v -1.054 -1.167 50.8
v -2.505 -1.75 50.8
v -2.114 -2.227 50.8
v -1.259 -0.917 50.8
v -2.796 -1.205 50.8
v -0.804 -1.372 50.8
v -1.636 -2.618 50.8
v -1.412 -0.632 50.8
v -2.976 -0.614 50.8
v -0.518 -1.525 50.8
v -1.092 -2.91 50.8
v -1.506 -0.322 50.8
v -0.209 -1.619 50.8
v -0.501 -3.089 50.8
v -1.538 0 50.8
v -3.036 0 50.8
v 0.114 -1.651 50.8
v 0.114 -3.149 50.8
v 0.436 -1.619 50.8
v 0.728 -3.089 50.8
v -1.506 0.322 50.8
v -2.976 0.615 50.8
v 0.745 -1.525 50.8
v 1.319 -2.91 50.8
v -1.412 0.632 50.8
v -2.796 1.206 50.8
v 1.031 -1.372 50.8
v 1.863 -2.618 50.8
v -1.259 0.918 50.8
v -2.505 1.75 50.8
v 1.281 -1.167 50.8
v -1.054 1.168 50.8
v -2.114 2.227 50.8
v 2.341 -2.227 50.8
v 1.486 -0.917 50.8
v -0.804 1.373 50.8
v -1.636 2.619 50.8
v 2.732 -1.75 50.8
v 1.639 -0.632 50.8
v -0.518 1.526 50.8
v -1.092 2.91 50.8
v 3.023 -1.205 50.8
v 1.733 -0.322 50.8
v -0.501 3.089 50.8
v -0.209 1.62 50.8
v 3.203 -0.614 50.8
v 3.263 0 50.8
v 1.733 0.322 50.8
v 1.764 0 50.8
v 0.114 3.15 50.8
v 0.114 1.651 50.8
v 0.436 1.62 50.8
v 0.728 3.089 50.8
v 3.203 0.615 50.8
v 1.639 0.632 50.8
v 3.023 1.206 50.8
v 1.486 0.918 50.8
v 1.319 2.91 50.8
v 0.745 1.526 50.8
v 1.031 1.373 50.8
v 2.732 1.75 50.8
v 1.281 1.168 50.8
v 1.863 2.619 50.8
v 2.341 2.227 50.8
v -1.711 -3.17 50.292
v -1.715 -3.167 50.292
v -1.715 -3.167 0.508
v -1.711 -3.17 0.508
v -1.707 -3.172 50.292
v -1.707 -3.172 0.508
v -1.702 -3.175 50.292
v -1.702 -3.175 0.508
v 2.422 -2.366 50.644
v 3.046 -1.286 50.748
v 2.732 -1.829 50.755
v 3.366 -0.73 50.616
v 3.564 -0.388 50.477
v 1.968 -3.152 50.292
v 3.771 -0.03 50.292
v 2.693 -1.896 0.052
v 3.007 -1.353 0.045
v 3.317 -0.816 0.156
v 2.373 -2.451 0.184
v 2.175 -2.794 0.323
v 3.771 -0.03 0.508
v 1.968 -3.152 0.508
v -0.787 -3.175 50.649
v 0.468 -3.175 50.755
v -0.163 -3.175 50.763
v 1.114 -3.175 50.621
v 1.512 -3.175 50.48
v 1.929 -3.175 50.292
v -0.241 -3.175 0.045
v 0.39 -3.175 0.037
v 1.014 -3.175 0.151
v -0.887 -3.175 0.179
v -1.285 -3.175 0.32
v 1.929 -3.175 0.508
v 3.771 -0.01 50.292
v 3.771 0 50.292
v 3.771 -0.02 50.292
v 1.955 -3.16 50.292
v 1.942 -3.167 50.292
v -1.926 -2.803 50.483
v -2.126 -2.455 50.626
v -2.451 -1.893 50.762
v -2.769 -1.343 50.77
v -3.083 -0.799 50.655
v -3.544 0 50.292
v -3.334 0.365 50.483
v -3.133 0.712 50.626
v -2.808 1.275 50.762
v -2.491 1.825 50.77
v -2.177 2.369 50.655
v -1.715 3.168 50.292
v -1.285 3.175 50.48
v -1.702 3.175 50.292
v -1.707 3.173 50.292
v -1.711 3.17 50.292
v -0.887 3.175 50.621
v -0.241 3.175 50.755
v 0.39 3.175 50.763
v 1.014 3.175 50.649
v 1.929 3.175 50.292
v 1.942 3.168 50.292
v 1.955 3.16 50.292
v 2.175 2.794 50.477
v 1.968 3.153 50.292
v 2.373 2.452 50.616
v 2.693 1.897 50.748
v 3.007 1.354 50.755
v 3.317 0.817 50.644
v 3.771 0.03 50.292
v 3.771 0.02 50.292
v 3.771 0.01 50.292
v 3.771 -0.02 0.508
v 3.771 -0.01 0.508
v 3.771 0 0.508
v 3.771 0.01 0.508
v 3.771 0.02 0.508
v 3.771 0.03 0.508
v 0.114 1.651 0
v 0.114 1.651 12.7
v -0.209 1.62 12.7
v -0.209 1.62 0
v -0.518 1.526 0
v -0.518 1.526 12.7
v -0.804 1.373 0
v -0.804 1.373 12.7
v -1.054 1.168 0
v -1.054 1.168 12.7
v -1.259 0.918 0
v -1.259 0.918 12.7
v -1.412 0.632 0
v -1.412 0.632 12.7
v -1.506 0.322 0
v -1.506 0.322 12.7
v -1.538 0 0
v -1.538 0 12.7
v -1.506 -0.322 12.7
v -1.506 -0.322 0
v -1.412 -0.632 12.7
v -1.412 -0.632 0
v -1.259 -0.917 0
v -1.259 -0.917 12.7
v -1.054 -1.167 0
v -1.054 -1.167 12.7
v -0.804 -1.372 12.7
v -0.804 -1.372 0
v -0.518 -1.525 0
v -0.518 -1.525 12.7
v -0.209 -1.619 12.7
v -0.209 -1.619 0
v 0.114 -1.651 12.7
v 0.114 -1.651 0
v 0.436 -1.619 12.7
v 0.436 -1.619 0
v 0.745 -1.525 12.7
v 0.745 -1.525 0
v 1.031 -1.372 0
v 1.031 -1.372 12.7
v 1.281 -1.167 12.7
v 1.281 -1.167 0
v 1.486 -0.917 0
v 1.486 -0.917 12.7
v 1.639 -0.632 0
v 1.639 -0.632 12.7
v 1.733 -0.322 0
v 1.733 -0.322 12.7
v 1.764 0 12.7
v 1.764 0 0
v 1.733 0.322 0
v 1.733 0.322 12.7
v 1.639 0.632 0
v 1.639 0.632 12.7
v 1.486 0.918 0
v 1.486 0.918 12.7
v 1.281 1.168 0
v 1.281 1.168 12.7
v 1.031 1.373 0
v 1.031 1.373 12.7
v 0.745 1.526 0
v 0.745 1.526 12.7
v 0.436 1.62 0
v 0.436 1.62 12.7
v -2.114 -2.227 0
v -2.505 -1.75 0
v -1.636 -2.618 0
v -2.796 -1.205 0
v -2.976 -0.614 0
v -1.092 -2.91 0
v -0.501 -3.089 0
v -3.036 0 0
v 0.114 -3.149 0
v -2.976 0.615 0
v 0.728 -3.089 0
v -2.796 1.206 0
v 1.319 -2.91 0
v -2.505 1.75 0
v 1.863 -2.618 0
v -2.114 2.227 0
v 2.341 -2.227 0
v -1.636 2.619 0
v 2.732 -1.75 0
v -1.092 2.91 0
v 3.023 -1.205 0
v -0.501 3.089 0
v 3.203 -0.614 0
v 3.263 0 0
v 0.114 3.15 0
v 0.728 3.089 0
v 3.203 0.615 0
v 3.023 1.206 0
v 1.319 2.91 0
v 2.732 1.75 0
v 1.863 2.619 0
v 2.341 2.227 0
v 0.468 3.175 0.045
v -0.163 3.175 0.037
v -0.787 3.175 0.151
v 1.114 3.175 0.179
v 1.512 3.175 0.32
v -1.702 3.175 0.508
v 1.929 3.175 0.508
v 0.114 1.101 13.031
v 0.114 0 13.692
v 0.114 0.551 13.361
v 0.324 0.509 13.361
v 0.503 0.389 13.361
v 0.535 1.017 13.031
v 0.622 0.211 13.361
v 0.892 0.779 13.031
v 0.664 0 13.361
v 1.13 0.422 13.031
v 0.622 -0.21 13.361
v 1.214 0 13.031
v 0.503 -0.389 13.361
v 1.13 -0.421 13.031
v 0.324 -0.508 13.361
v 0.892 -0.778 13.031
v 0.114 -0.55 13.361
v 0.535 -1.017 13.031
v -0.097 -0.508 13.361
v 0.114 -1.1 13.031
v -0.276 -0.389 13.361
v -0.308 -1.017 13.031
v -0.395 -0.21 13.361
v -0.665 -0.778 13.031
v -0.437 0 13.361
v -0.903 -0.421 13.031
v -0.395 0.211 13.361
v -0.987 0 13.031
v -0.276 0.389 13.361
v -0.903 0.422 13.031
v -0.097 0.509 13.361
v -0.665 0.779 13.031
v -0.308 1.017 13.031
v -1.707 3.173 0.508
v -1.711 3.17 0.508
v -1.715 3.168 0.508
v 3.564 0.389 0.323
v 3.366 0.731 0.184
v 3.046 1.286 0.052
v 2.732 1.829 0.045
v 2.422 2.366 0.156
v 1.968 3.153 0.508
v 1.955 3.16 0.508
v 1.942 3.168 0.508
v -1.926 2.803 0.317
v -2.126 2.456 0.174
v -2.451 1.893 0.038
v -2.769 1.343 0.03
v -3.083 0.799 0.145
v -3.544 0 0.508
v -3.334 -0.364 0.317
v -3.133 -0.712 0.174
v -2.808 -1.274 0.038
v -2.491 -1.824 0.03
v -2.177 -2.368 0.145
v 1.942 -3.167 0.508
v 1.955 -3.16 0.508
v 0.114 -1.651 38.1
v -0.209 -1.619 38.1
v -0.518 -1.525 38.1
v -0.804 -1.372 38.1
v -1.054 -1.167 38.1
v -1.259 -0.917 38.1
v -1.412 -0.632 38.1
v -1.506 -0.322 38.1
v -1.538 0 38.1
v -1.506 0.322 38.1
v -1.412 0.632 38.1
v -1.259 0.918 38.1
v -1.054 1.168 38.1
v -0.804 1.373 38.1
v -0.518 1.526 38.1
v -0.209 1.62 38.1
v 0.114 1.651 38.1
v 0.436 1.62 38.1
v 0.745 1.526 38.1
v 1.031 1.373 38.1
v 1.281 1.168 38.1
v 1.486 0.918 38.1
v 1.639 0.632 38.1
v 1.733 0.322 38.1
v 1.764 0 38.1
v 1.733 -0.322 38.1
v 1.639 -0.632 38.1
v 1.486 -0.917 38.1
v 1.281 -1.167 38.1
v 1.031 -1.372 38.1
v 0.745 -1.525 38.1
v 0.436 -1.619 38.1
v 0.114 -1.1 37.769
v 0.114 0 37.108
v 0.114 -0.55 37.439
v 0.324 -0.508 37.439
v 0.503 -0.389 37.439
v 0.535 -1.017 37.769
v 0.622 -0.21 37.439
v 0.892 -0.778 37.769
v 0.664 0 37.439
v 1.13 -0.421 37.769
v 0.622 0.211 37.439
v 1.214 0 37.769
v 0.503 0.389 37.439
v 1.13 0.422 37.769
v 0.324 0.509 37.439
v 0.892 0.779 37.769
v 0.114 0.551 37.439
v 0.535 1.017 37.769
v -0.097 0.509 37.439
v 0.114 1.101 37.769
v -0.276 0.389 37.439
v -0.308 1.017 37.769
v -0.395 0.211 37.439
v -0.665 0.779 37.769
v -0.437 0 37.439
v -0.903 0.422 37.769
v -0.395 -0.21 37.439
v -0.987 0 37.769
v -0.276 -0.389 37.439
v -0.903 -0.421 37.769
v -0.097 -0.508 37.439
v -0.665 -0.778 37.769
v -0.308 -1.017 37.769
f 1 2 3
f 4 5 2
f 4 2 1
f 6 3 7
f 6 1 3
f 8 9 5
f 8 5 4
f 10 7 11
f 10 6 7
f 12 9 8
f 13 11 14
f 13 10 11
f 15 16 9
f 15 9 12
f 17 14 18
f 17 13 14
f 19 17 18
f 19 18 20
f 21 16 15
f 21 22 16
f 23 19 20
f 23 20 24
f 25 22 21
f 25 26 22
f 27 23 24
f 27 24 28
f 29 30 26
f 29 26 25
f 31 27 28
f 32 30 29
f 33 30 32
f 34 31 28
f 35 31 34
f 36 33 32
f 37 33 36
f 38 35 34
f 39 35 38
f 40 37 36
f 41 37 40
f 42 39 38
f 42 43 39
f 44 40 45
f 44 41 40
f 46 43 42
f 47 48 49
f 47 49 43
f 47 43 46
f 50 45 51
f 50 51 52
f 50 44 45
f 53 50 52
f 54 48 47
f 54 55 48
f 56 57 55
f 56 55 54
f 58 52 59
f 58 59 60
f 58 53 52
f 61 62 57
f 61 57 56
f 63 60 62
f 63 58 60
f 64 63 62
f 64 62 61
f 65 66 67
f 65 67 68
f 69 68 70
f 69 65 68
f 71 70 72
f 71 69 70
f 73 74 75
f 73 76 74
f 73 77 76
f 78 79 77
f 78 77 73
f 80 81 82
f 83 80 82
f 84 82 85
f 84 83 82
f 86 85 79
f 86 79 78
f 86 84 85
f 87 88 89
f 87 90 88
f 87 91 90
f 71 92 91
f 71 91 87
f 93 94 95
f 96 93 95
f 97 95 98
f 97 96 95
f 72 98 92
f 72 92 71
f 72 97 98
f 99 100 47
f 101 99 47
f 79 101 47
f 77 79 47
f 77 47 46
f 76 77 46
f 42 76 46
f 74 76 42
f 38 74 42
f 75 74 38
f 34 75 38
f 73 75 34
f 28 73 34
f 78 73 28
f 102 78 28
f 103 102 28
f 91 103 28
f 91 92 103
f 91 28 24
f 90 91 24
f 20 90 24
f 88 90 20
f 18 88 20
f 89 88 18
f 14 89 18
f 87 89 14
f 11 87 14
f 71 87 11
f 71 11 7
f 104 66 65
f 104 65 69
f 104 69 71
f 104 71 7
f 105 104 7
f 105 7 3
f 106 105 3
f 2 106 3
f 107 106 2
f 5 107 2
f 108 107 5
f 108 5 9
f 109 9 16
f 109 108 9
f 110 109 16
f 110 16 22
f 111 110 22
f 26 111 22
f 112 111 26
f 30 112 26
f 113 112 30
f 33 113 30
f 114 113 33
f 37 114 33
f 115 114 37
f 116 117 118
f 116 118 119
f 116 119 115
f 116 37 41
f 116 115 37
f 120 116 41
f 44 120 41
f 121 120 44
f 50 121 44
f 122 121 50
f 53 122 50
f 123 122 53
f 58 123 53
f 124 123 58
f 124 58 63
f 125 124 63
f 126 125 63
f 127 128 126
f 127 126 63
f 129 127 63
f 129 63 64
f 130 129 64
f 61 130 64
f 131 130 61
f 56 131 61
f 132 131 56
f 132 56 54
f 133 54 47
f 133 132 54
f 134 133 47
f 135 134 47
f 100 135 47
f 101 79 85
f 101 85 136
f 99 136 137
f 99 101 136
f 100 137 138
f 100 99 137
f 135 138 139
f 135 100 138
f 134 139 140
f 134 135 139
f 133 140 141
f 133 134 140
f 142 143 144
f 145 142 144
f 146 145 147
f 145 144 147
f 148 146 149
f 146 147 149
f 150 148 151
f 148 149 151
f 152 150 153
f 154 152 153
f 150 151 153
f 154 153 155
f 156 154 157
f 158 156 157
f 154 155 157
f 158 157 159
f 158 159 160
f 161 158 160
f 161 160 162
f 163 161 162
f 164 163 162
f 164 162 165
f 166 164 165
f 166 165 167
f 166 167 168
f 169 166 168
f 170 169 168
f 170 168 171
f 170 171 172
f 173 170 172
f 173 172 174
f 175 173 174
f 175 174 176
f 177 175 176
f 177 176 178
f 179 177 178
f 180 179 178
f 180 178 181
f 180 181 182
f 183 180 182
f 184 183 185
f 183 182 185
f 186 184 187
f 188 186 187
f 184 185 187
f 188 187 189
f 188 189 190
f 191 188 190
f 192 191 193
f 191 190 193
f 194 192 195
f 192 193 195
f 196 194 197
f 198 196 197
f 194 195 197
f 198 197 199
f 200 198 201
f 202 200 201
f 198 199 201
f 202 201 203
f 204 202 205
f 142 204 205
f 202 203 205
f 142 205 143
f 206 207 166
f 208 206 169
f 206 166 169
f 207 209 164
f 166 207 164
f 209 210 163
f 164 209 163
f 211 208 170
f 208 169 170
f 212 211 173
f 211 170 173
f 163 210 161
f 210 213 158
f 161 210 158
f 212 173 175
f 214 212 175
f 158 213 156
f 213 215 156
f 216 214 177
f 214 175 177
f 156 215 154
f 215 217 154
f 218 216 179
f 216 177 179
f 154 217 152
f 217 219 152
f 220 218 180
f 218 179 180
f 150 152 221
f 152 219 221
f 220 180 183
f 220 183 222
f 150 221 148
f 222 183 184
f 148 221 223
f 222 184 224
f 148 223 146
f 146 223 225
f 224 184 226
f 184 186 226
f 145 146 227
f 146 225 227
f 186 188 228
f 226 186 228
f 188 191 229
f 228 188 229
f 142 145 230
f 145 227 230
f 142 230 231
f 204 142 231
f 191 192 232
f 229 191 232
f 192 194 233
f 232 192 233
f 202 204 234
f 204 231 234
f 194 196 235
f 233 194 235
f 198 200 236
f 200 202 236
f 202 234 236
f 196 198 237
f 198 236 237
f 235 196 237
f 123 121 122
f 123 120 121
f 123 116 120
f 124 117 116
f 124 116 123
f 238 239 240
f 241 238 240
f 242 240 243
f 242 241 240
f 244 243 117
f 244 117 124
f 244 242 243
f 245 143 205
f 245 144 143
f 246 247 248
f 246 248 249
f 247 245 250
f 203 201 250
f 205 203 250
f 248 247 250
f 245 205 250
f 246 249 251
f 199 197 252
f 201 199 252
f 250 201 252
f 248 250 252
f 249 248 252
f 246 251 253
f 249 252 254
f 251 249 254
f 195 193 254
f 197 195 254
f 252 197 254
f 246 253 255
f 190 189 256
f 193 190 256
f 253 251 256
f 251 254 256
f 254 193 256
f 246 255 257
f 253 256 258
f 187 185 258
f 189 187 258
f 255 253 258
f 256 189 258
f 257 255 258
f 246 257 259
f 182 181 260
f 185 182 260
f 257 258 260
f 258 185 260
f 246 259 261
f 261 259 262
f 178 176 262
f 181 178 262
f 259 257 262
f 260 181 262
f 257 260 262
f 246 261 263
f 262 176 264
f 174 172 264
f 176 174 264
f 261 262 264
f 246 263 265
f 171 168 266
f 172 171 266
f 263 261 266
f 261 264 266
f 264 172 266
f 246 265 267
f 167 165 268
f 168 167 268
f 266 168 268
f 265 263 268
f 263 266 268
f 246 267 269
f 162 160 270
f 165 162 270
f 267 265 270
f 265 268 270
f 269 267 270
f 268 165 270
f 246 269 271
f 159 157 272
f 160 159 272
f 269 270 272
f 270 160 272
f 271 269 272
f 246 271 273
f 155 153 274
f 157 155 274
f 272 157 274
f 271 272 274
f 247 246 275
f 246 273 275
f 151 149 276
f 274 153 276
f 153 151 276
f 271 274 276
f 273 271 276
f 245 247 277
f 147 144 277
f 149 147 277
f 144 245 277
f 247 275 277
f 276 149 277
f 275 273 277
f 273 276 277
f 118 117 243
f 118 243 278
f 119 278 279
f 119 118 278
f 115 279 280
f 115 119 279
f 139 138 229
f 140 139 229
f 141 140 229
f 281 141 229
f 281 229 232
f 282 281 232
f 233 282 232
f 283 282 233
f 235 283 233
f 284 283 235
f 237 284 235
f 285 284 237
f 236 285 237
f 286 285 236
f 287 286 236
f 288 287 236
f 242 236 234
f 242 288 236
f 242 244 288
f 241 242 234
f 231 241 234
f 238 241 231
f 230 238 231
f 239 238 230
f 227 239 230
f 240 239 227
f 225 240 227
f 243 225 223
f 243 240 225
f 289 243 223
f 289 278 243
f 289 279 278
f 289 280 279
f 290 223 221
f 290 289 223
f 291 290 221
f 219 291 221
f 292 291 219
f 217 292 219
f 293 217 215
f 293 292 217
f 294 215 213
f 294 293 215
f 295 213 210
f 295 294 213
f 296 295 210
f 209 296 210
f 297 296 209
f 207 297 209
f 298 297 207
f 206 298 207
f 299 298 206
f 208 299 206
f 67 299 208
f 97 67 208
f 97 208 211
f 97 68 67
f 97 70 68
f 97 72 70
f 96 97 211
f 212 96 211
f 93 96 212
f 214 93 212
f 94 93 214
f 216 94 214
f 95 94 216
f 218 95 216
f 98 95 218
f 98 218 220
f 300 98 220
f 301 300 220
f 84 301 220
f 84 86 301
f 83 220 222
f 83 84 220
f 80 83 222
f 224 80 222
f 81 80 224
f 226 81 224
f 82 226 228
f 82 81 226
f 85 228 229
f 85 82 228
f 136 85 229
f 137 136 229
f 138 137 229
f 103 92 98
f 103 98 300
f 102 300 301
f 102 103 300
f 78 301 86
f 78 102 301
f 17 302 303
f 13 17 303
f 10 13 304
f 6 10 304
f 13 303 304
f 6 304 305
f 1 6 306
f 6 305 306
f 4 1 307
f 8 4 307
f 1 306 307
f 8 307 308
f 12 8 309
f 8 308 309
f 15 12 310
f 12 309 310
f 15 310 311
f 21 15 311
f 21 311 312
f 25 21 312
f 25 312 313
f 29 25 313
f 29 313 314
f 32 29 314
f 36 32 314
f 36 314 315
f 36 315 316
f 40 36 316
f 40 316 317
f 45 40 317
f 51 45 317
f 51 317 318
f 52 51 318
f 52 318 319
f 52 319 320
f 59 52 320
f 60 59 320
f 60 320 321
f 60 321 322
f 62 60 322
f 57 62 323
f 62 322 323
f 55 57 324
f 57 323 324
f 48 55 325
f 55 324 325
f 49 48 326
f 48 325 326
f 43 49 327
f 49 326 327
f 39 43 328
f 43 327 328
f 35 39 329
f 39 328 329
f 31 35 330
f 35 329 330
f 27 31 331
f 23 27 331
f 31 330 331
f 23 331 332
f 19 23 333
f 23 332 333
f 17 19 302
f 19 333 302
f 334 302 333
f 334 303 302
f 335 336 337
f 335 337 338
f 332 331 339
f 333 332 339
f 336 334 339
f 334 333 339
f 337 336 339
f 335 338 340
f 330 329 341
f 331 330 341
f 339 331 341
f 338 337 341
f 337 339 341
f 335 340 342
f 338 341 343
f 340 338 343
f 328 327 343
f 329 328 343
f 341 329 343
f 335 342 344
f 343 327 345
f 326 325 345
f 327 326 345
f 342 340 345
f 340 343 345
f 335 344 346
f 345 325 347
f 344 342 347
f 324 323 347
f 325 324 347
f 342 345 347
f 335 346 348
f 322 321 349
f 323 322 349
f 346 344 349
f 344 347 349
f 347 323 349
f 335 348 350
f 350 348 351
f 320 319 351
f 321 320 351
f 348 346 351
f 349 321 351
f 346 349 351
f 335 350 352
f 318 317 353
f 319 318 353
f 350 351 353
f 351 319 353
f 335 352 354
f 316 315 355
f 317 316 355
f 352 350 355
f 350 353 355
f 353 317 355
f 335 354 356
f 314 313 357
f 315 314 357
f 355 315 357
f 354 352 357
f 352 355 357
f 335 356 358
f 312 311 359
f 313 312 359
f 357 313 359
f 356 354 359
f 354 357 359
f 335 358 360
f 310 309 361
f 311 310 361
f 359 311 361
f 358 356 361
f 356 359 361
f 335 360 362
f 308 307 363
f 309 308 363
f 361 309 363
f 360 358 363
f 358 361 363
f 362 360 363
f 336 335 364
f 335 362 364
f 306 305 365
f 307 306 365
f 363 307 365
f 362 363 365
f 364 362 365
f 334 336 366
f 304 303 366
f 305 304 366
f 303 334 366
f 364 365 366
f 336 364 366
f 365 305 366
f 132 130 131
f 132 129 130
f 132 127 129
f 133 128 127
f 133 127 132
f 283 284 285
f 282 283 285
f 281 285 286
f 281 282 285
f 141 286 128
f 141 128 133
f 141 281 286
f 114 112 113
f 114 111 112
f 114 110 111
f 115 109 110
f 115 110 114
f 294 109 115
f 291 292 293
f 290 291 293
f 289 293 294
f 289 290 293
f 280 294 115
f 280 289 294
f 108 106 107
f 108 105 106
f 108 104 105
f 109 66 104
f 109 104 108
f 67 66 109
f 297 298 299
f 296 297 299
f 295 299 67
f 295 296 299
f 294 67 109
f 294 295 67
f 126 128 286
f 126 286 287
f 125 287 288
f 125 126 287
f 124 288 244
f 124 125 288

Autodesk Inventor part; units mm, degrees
ref_plane "YZ Plane" through (0, 0, 0) normal (1, 0, 0) x (0, 1, 0)
ref_plane "XZ Plane" through (0, 0, 0) normal (0, 1, 0) x (-1, 0, 0)
sketch "Sketch1" plane through (0, 0, 0) normal (0, 0, 1) x (1, 0, 0)
  line L0 (1.9552, -3.1747) -> (-1.711, -3.1747)
  line L1 (-1.711, -3.1747) -> (-3.5441, 0.0003)
  line L2 (-3.5441, 0.0003) -> (-1.711, 3.1753)
  line L3 (-1.711, 3.1753) -> (1.9552, 3.1753)
  line L4 (1.9552, 3.1753) -> (3.7883, 0.0003)
  line L5 (3.7883, 0.0003) -> (1.9552, -3.1747)
  point P0 (0.1221, 0.0003)
  dimension "d0" = 6.35
extrude "Extrusion1" add sketch "Sketch1" along normal blind 50.8
ref_plane "Work Plane1" through (-1.711, 0.0003, 0) normal (0, 1, 0) x (1, 0, 0)
sketch "Sketch3" plane through (-1.711, 0.0003, 0) normal (0, 1, 0) x (1, 0, 0)
  line L0 (-1.3251, 0) -> (4.9741, 0)
  line L1 (5.4821, -0.508) -> (5.4821, -50.292)
  line L2 (4.9741, -50.8) -> (-1.3251, -50.8)
  line L3 (-1.8331, -50.292) -> (-1.8331, -0.508)
  line L4 (-1.8331, -0.508) -> (-1.3251, 0)
  line L5 (4.9741, 0) -> (5.4821, -0.508)
  line L6 (-1.3251, -50.8) -> (-1.8331, -50.292)
  line L7 (5.4821, -50.292) -> (4.9741, -50.8)
  line L8 (-1.8331, 0) -> (-1.8331, -50.8) projected
  line L9 (3.6662, 0) -> (5.4993, 0) projected
  line L10 (1.8245, 0) -> (1.8245, -50.8)
  point P0 (-1.8331, 0)
  point P1 (5.4821, -50.8)
  point P2 (5.4821, 0)
  point P3 (-1.8331, -50.8)
  dimension "d5" = 0.508
  dimension "d6" = 0.508
  dimension "d7" = 0.508
  dimension "d8" = 0.508
  dimension "d9" = 0.508
  dimension "d10" = 0.508
  dimension "d11" = 0.508
  dimension "d12" = 0.508
  dimension "d13" = 7.3152
  dimension "d14" = 0
  dimension "d15" = 50.8
  dimension "d16" = 0
revolve "Revolution1" cut sketch "Sketch3" angle 360 about axis through (0.1135, 0.0003, 0) along (0, 0, 1) keep common part contours L0 L5 L1 L7 L2 L10
sketch "Sketch5" plane through (0.1135, 0.0003, 50.8) normal (0, 0, 1) x (1, 0, 0)
  circle A0 centre (0, 0) radius 3.1496 projected
hole "Hole2" at (0.1135, 0.0003, 50.8) at (0.1135, 0.0003, 50.8) direction (0, 0, -1) diameter 3.302 depth 12.7 tip angle 118 thread size "8-32 UNC" class "2B" standard "ANSI Unified Screw Threads"
sketch "Sketch6" plane through (0.1135, 0.0003, 0) normal (0, 0, -1) x (-1, 0, 0)
  circle A0 centre (0, 0) radius 3.1496 projected
hole "Hole3" at (0.1135, 0.0003, 0) direction (0, 0, 1) diameter 3.302 depth 12.7 tip angle 118 thread size "8-32 UNC" class "2B" standard "ANSI Unified Screw Threads"
equation "\"d6\" = d5"
equation "\"d7\" = d5"
equation "\"d8\" = d7"
equation "\"d9\" = d5"
equation "\"d10\" = d9"
equation "\"d11\" = d5"
equation "\"d12\" = d11"
properties part number "275-1018" material "Steel"
